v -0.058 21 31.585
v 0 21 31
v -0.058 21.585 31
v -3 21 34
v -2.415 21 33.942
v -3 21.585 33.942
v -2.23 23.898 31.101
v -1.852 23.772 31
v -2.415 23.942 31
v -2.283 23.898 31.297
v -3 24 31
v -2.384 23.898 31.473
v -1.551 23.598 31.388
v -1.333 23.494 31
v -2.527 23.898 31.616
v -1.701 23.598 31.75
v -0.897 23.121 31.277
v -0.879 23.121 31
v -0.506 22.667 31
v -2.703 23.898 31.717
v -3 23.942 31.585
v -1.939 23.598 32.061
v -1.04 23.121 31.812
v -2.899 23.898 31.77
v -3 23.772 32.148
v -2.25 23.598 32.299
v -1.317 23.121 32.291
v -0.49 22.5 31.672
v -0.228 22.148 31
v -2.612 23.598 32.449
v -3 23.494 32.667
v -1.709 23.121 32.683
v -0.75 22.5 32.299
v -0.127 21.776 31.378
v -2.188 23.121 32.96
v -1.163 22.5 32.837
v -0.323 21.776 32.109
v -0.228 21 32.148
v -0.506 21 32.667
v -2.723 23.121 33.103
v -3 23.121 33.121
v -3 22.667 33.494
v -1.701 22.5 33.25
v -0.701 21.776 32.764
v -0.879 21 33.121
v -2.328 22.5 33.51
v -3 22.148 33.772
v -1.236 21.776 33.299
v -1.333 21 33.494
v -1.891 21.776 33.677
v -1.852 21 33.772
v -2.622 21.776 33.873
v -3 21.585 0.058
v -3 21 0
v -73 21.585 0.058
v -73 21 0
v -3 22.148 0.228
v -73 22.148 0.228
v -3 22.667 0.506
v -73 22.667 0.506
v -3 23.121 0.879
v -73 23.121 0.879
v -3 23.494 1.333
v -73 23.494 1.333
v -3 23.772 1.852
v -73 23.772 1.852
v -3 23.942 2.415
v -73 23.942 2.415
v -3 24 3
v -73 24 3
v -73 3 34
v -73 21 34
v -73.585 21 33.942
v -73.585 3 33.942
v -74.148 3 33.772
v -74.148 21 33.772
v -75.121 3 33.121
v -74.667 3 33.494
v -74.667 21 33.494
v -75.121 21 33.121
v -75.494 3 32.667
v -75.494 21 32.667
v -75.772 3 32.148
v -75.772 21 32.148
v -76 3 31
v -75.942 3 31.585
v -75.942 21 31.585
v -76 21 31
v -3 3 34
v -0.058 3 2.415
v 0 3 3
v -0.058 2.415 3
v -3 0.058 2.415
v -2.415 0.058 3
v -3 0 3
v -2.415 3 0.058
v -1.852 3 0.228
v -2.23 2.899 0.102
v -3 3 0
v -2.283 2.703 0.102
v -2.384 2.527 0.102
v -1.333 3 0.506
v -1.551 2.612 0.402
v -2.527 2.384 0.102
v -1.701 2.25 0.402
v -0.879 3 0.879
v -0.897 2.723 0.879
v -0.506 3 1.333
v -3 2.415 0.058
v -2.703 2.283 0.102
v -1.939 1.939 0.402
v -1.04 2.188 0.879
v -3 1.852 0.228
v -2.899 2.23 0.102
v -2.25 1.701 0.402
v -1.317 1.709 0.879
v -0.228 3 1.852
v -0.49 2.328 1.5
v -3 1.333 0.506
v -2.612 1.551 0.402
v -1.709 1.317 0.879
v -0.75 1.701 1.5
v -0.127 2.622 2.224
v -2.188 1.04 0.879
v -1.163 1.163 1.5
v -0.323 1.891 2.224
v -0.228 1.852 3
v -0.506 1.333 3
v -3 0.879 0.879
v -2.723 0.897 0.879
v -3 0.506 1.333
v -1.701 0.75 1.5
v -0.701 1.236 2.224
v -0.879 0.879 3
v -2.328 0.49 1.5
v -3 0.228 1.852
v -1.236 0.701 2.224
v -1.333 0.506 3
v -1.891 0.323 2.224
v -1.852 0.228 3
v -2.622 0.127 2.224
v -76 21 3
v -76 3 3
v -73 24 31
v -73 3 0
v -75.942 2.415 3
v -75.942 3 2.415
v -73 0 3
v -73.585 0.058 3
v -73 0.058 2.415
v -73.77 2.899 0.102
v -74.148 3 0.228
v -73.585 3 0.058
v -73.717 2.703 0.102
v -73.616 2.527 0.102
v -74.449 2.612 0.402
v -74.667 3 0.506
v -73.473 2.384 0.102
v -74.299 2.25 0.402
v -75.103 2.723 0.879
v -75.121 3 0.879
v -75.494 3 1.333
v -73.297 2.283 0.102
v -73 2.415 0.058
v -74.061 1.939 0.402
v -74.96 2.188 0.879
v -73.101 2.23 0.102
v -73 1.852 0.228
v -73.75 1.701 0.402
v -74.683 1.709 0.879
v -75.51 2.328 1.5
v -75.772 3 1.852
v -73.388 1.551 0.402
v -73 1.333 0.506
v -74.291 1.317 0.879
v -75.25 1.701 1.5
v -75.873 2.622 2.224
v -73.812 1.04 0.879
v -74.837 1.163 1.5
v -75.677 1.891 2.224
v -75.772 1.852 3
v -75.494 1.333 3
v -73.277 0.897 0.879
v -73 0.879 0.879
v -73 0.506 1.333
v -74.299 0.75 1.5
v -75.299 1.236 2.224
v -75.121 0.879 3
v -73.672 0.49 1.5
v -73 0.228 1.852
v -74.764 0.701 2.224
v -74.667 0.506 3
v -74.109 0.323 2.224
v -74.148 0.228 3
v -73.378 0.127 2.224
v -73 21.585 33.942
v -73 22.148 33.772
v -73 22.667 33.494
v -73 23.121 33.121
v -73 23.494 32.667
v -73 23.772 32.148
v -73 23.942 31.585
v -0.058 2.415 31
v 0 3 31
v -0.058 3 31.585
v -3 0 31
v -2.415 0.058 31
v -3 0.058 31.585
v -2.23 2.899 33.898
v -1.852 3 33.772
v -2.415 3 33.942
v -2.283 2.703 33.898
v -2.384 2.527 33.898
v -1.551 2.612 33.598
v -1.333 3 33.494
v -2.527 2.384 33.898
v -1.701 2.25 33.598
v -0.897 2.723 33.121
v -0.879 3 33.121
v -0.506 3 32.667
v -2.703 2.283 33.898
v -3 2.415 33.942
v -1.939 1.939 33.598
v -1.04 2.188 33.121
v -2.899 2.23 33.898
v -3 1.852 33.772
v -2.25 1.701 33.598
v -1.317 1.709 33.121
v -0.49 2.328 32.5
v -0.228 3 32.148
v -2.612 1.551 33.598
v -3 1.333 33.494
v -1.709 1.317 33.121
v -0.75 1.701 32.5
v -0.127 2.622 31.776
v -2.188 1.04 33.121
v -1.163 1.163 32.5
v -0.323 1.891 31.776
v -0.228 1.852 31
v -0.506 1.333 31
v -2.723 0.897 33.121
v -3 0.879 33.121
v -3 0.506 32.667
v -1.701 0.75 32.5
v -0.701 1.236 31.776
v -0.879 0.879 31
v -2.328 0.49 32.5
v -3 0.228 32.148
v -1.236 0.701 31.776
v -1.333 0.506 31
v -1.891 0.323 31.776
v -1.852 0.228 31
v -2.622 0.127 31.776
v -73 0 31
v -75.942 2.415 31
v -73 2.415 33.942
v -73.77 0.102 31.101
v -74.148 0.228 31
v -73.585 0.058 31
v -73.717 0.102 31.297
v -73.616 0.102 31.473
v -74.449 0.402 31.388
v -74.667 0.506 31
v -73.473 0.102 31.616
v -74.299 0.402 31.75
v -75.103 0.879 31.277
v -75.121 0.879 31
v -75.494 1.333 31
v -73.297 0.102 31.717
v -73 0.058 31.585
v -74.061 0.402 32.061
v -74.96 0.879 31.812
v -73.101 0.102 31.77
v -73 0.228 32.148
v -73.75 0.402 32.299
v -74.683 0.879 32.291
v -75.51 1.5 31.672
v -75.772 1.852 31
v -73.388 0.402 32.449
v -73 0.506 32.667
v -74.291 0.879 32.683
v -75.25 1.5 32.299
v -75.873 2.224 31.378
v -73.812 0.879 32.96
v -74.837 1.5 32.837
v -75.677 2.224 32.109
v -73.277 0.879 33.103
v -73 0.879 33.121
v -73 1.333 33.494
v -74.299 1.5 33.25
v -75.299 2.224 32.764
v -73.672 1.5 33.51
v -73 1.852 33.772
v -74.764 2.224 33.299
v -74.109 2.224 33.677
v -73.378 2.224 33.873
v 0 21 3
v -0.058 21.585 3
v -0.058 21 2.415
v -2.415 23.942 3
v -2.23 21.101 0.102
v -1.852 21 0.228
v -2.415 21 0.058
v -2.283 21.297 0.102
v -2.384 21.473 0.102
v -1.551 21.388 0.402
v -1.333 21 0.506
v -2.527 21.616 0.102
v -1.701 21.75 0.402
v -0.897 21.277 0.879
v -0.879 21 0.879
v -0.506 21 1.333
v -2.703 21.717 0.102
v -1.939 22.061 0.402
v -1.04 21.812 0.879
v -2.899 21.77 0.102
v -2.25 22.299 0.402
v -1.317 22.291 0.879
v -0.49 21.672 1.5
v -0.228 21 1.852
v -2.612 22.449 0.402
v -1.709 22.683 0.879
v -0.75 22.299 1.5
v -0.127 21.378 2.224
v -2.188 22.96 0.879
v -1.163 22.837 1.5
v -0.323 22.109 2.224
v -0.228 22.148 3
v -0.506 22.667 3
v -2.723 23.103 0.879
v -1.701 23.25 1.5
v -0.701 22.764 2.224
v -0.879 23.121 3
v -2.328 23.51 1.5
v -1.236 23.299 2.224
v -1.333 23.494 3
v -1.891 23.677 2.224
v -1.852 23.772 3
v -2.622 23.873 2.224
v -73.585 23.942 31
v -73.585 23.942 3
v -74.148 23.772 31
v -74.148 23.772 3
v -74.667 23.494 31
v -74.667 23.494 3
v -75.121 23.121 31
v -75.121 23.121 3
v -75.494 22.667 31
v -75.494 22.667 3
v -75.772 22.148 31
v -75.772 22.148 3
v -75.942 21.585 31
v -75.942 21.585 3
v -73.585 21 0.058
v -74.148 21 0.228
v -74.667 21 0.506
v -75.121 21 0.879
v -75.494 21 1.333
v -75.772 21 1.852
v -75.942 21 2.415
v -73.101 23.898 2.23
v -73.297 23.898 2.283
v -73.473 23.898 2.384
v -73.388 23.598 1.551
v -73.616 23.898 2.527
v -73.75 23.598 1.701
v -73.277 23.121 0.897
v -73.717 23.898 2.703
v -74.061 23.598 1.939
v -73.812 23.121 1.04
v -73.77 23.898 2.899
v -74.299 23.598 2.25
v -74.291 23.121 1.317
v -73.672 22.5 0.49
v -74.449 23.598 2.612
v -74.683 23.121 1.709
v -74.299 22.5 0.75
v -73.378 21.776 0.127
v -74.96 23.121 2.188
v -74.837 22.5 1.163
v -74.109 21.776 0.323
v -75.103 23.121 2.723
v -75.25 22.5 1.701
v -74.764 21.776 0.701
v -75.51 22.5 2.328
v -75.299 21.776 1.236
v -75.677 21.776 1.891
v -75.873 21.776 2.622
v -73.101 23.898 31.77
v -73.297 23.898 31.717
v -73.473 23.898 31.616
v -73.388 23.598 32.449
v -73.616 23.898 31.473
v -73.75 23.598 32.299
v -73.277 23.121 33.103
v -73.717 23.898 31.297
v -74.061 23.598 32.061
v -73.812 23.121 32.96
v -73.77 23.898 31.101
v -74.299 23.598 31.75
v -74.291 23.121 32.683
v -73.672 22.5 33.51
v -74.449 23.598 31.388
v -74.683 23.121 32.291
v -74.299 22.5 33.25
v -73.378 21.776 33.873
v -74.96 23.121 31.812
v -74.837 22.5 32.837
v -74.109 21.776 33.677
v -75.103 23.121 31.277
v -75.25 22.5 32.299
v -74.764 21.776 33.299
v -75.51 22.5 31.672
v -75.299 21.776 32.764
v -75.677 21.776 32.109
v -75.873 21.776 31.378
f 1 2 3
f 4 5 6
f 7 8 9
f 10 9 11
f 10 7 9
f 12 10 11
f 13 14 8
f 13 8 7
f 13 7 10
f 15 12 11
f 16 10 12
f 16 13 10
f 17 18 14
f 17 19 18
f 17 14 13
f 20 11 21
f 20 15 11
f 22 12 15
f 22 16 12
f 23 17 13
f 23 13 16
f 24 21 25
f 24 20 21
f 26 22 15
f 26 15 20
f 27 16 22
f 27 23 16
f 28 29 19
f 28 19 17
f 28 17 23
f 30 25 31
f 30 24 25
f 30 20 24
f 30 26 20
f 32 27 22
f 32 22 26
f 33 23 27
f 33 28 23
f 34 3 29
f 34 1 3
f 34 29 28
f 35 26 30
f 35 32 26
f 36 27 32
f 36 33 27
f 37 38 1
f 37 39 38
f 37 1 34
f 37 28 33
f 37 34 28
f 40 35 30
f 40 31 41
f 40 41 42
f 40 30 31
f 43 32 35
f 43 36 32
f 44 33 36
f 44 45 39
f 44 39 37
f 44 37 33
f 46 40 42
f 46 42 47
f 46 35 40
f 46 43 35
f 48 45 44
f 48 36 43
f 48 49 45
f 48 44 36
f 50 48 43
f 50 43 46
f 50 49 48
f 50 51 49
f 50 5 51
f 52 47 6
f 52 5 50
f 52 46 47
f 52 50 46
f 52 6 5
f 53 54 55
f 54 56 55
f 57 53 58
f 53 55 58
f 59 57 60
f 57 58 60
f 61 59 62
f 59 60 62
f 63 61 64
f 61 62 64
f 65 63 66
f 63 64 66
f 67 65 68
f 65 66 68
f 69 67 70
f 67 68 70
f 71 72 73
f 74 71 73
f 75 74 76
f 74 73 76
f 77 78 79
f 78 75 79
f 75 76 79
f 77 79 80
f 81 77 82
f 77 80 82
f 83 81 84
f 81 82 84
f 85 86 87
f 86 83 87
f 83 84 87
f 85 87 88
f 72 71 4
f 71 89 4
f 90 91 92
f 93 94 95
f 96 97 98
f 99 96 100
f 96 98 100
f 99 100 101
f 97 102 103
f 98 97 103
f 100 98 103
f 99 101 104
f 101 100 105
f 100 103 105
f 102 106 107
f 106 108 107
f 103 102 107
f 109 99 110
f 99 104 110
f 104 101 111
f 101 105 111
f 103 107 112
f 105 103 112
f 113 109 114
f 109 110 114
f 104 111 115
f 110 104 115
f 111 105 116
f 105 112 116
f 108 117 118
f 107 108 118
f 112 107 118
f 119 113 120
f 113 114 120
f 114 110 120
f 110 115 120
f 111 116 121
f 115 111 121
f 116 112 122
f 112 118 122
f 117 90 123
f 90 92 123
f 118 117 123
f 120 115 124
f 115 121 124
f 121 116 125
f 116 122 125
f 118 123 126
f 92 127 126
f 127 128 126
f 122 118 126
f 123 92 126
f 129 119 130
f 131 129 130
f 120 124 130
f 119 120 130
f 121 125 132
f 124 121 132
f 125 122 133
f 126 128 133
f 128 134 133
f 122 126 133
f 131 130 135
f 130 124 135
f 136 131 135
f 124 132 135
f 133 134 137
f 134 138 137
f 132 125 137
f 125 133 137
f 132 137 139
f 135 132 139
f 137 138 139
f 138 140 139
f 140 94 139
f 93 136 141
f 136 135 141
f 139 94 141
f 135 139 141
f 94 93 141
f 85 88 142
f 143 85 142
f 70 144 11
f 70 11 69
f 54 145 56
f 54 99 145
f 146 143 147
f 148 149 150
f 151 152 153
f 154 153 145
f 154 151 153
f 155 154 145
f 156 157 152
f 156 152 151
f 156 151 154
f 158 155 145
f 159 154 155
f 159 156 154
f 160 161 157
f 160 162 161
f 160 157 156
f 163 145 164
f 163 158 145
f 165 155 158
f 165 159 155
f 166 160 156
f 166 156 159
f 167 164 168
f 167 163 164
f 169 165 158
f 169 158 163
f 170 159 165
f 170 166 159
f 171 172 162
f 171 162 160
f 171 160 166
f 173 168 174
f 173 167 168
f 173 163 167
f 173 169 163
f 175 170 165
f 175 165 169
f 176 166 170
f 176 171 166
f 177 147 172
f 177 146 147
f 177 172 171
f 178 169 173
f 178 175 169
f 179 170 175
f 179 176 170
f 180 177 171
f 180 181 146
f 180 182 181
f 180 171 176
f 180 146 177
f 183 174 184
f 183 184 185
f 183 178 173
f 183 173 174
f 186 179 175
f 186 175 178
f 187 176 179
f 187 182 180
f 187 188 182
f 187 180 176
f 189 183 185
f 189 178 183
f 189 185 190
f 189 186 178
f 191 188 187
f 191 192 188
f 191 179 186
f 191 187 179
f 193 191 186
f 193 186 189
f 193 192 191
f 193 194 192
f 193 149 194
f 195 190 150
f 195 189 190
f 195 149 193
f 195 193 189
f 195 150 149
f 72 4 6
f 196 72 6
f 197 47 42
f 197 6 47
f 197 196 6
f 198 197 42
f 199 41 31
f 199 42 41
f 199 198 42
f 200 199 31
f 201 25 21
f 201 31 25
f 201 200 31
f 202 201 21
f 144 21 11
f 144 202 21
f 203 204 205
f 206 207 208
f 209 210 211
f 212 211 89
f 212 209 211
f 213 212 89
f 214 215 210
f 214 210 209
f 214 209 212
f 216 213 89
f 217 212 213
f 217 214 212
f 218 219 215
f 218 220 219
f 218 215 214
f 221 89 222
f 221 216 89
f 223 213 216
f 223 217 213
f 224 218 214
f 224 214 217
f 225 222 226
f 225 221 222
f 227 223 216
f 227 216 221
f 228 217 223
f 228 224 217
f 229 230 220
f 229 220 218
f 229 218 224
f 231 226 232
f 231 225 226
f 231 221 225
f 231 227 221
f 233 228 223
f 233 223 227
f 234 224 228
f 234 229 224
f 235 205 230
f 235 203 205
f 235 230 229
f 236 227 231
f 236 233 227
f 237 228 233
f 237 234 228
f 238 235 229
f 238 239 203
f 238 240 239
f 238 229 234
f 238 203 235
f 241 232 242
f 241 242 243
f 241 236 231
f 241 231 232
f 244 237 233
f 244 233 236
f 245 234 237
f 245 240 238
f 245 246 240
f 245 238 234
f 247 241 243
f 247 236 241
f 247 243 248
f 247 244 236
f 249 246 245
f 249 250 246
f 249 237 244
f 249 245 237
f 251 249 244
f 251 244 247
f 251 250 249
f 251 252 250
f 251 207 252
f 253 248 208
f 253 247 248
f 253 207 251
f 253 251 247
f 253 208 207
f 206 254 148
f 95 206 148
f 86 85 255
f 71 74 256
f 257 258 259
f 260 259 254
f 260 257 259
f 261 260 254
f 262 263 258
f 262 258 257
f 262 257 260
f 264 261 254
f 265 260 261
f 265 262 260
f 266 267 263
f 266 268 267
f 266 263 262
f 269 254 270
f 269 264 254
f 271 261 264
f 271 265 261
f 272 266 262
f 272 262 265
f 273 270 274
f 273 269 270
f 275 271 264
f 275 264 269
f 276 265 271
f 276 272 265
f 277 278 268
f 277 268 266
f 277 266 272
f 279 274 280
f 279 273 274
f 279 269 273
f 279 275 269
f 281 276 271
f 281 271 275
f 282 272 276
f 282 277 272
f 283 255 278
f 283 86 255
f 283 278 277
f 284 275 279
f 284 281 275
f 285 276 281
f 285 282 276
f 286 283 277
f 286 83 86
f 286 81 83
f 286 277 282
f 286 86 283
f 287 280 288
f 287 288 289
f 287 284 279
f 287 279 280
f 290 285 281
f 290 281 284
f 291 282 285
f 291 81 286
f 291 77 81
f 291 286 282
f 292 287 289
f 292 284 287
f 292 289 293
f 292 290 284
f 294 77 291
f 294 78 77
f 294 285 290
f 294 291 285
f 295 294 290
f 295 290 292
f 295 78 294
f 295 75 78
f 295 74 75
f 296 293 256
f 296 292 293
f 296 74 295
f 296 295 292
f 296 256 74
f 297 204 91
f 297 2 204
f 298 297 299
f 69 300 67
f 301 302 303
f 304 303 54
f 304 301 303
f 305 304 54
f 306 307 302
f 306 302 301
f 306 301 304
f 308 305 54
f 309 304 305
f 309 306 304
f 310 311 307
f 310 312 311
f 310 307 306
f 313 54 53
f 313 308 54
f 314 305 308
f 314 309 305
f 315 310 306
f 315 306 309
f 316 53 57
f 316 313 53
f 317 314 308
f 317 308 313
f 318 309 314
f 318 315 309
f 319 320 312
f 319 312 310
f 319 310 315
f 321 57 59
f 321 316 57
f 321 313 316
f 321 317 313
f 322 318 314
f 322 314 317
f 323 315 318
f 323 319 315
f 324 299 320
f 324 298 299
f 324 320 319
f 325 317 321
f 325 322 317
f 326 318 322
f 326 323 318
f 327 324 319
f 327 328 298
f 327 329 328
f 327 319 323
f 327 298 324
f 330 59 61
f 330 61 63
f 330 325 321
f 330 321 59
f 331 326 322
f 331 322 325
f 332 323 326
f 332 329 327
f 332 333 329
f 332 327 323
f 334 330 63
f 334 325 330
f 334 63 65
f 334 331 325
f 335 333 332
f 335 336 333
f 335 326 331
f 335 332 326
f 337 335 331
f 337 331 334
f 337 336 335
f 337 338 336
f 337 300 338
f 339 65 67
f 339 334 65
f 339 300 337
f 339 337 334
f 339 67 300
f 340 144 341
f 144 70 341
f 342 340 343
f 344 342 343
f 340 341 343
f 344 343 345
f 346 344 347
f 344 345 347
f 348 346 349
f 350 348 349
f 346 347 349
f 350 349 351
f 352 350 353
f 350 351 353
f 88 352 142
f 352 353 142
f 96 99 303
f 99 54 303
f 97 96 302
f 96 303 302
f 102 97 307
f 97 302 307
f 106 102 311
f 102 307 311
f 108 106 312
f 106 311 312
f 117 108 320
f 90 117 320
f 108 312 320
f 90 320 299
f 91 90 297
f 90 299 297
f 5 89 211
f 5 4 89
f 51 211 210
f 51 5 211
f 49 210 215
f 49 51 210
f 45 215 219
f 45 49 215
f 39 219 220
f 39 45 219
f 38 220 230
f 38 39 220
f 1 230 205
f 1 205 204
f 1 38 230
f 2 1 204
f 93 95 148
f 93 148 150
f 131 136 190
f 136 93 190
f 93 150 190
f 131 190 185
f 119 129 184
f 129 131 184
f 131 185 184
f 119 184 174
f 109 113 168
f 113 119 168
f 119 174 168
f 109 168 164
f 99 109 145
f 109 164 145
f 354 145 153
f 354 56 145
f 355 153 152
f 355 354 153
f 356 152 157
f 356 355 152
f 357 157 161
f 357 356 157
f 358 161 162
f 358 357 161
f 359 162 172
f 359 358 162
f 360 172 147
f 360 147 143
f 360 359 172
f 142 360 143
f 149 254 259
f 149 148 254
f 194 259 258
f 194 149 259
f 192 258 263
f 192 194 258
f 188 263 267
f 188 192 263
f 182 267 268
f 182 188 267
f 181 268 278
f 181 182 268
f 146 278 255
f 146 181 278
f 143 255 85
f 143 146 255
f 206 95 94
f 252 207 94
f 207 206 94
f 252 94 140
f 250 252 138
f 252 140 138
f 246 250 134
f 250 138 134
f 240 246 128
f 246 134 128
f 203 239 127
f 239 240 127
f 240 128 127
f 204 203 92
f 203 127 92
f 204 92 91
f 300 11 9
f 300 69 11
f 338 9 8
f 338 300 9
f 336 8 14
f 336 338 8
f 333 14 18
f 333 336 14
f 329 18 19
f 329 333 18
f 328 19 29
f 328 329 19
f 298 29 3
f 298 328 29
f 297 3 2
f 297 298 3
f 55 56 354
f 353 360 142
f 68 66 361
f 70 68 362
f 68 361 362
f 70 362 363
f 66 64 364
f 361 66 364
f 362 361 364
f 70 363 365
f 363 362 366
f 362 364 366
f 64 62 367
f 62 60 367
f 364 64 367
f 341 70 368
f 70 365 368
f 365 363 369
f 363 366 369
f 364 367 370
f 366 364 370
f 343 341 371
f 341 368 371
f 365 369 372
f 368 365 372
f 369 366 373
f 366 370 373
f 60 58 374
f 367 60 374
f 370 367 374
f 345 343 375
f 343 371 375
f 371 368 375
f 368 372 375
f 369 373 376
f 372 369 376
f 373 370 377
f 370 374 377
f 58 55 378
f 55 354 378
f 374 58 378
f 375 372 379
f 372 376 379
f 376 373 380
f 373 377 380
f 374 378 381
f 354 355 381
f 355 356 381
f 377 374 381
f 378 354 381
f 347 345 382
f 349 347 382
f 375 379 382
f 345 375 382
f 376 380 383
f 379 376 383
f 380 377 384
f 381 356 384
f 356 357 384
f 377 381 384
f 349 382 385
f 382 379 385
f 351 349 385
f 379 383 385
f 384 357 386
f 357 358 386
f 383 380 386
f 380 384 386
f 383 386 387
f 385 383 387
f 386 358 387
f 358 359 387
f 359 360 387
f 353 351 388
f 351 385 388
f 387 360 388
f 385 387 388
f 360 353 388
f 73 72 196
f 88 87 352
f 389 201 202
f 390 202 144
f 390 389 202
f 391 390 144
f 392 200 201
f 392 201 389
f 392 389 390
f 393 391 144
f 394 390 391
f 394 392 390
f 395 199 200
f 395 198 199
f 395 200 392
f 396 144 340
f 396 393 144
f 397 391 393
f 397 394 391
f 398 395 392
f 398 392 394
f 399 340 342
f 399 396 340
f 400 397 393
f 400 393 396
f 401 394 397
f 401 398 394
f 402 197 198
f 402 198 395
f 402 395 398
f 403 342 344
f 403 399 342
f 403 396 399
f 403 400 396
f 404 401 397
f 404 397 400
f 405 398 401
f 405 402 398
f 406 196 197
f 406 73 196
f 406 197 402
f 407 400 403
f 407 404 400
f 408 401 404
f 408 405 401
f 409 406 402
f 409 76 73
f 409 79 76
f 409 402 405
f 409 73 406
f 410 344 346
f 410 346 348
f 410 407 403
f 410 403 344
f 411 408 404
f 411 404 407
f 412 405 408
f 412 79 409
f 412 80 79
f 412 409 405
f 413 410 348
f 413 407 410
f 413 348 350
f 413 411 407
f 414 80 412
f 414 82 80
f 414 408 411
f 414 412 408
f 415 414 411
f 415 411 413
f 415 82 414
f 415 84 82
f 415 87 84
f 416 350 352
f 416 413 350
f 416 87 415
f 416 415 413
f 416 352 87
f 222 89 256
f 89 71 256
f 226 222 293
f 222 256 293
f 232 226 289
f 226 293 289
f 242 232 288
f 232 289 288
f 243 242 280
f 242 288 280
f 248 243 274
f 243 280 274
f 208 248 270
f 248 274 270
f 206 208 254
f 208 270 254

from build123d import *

# Parameters (mm, degrees)
SKETCH1_W           = 34
SKETCH1_H           = 24
BOSS_EXTRUDE1_DEPTH = 76
FILLET1_R           = 3


with BuildPart() as part:
    # Sketch1 → Boss-Extrude1 (new body)
    with BuildSketch(Plane(origin=(0, 0, 0), x_dir=(0, 0, -1), z_dir=(1, 0, 0))):
        with Locations((-17, 12)):
            Rectangle(SKETCH1_W, SKETCH1_H)
    extrude(amount=-BOSS_EXTRUDE1_DEPTH)

    # Fillet1
    fillet1_edges = [part.edges().sort_by_distance(p)[0] for p in [
        (-76, 12, 34),
        (-76, 0, 17),
        (-76, 12, 0),
        (0, 0, 17),
        (0, 12, 34),
        (0, 24, 17),
        (0, 12, 0),
        (-38, 0, 0),
        (-38, 0, 34),
        (-38, 24, 34),
        (-38, 24, 0),
        (-76, 24, 17),
    ]]
    fillet(fillet1_edges, radius=FILLET1_R)


solid = part.part
